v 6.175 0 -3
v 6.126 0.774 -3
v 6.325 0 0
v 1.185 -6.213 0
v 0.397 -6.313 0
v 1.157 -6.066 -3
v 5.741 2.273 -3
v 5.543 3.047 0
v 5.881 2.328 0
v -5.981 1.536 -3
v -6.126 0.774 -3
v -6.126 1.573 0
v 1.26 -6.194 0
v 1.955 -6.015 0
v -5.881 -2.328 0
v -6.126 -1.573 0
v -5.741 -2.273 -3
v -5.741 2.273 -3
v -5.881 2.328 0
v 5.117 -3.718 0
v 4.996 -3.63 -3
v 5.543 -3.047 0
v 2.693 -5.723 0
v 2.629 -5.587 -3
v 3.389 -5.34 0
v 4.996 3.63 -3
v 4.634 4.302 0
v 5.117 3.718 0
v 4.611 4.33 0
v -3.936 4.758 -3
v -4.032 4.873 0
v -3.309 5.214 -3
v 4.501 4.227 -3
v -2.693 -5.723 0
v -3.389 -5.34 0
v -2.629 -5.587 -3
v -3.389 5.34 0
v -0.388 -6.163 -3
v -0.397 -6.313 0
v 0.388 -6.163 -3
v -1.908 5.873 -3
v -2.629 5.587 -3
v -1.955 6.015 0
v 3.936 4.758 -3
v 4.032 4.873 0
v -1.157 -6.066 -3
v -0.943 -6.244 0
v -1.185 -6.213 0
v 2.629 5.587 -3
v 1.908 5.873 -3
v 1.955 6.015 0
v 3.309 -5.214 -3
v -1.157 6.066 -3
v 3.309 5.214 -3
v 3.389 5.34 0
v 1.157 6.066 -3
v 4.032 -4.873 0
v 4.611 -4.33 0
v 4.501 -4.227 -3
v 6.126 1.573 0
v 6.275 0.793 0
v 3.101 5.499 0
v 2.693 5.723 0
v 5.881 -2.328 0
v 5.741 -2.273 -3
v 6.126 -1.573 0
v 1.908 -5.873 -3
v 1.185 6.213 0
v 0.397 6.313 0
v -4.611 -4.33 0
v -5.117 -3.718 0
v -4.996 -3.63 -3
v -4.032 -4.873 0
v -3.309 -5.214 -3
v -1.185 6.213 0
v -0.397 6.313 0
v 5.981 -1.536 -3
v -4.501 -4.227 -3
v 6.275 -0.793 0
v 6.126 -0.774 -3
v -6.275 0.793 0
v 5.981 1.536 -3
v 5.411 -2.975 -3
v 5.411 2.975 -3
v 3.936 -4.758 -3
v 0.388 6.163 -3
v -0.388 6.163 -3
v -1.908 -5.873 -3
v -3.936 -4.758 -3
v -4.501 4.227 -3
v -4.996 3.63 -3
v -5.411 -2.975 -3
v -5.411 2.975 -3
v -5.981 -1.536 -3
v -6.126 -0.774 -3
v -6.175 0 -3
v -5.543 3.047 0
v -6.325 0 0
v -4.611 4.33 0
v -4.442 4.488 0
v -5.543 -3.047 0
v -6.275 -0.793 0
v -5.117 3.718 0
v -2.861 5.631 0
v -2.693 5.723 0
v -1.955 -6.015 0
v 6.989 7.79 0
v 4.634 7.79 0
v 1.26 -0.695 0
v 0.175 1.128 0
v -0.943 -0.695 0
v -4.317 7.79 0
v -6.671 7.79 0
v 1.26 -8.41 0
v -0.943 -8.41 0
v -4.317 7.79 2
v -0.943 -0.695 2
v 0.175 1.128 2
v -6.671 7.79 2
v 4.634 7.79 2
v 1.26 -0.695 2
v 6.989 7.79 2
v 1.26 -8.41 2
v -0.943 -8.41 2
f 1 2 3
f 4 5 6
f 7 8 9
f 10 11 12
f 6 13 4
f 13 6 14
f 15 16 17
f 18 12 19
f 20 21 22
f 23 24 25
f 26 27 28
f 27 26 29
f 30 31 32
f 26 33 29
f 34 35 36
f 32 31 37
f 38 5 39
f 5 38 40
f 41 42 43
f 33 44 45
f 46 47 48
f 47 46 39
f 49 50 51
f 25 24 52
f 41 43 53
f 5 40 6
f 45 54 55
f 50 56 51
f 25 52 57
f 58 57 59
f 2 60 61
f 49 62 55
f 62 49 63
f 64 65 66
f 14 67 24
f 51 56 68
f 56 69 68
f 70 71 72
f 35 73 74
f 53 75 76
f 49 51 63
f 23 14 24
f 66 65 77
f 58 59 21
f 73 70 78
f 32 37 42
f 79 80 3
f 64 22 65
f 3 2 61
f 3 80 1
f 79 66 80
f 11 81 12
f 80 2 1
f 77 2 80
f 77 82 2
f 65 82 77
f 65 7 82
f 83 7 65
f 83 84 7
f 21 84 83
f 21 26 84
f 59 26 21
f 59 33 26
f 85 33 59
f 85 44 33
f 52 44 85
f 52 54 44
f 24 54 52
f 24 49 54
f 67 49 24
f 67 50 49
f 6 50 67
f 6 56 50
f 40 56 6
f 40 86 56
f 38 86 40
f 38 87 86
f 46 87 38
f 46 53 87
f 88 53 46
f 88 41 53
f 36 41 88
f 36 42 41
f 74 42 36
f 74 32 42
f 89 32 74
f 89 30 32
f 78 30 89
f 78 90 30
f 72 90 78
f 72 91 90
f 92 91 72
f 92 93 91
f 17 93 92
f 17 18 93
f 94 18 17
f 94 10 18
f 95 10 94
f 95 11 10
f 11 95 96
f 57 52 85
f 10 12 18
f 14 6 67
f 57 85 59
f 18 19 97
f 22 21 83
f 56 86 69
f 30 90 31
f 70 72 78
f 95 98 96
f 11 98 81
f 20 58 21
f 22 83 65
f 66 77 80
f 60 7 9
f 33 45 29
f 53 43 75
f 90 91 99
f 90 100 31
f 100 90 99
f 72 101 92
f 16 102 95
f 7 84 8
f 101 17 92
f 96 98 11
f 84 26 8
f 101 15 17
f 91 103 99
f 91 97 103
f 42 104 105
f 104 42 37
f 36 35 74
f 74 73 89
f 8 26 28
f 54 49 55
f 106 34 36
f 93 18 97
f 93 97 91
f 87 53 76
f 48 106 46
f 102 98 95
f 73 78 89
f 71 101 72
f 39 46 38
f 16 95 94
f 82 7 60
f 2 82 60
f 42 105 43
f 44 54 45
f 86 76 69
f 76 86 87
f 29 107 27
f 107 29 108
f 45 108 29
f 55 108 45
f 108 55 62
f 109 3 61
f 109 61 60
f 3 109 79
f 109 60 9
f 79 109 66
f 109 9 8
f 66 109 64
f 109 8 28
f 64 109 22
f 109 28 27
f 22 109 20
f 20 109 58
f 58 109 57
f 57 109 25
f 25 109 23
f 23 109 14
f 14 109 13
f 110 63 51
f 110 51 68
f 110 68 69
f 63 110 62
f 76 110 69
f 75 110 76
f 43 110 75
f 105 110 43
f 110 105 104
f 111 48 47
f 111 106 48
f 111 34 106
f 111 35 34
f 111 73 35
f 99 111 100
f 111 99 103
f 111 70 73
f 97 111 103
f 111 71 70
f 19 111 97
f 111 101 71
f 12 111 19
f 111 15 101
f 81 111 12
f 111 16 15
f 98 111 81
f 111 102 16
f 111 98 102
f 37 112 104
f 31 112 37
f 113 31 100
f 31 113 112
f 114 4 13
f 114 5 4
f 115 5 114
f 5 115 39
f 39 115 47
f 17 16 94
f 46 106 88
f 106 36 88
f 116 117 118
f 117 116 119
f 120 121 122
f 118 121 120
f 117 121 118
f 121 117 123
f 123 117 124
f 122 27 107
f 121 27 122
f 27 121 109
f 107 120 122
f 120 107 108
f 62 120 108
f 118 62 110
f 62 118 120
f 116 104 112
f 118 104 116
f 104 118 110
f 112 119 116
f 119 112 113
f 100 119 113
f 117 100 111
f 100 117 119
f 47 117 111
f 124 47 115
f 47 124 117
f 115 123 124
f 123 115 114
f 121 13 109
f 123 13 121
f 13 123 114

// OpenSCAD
$fn = 50;


difference() {
	union() {
		translate(v = [0, 0, -3.0000000000]) {
			cylinder(h = 3, r1 = 6.1750000000, r2 = 6.3250000000);
		}
		translate(v = [0, -0.5000000000, 0]) {
			linear_extrude(height = 2) {
				text(font = "Webdings", halign = "center", size = 16, text = "Y", valign = "center");
			}
		}
	}
	union();
}
